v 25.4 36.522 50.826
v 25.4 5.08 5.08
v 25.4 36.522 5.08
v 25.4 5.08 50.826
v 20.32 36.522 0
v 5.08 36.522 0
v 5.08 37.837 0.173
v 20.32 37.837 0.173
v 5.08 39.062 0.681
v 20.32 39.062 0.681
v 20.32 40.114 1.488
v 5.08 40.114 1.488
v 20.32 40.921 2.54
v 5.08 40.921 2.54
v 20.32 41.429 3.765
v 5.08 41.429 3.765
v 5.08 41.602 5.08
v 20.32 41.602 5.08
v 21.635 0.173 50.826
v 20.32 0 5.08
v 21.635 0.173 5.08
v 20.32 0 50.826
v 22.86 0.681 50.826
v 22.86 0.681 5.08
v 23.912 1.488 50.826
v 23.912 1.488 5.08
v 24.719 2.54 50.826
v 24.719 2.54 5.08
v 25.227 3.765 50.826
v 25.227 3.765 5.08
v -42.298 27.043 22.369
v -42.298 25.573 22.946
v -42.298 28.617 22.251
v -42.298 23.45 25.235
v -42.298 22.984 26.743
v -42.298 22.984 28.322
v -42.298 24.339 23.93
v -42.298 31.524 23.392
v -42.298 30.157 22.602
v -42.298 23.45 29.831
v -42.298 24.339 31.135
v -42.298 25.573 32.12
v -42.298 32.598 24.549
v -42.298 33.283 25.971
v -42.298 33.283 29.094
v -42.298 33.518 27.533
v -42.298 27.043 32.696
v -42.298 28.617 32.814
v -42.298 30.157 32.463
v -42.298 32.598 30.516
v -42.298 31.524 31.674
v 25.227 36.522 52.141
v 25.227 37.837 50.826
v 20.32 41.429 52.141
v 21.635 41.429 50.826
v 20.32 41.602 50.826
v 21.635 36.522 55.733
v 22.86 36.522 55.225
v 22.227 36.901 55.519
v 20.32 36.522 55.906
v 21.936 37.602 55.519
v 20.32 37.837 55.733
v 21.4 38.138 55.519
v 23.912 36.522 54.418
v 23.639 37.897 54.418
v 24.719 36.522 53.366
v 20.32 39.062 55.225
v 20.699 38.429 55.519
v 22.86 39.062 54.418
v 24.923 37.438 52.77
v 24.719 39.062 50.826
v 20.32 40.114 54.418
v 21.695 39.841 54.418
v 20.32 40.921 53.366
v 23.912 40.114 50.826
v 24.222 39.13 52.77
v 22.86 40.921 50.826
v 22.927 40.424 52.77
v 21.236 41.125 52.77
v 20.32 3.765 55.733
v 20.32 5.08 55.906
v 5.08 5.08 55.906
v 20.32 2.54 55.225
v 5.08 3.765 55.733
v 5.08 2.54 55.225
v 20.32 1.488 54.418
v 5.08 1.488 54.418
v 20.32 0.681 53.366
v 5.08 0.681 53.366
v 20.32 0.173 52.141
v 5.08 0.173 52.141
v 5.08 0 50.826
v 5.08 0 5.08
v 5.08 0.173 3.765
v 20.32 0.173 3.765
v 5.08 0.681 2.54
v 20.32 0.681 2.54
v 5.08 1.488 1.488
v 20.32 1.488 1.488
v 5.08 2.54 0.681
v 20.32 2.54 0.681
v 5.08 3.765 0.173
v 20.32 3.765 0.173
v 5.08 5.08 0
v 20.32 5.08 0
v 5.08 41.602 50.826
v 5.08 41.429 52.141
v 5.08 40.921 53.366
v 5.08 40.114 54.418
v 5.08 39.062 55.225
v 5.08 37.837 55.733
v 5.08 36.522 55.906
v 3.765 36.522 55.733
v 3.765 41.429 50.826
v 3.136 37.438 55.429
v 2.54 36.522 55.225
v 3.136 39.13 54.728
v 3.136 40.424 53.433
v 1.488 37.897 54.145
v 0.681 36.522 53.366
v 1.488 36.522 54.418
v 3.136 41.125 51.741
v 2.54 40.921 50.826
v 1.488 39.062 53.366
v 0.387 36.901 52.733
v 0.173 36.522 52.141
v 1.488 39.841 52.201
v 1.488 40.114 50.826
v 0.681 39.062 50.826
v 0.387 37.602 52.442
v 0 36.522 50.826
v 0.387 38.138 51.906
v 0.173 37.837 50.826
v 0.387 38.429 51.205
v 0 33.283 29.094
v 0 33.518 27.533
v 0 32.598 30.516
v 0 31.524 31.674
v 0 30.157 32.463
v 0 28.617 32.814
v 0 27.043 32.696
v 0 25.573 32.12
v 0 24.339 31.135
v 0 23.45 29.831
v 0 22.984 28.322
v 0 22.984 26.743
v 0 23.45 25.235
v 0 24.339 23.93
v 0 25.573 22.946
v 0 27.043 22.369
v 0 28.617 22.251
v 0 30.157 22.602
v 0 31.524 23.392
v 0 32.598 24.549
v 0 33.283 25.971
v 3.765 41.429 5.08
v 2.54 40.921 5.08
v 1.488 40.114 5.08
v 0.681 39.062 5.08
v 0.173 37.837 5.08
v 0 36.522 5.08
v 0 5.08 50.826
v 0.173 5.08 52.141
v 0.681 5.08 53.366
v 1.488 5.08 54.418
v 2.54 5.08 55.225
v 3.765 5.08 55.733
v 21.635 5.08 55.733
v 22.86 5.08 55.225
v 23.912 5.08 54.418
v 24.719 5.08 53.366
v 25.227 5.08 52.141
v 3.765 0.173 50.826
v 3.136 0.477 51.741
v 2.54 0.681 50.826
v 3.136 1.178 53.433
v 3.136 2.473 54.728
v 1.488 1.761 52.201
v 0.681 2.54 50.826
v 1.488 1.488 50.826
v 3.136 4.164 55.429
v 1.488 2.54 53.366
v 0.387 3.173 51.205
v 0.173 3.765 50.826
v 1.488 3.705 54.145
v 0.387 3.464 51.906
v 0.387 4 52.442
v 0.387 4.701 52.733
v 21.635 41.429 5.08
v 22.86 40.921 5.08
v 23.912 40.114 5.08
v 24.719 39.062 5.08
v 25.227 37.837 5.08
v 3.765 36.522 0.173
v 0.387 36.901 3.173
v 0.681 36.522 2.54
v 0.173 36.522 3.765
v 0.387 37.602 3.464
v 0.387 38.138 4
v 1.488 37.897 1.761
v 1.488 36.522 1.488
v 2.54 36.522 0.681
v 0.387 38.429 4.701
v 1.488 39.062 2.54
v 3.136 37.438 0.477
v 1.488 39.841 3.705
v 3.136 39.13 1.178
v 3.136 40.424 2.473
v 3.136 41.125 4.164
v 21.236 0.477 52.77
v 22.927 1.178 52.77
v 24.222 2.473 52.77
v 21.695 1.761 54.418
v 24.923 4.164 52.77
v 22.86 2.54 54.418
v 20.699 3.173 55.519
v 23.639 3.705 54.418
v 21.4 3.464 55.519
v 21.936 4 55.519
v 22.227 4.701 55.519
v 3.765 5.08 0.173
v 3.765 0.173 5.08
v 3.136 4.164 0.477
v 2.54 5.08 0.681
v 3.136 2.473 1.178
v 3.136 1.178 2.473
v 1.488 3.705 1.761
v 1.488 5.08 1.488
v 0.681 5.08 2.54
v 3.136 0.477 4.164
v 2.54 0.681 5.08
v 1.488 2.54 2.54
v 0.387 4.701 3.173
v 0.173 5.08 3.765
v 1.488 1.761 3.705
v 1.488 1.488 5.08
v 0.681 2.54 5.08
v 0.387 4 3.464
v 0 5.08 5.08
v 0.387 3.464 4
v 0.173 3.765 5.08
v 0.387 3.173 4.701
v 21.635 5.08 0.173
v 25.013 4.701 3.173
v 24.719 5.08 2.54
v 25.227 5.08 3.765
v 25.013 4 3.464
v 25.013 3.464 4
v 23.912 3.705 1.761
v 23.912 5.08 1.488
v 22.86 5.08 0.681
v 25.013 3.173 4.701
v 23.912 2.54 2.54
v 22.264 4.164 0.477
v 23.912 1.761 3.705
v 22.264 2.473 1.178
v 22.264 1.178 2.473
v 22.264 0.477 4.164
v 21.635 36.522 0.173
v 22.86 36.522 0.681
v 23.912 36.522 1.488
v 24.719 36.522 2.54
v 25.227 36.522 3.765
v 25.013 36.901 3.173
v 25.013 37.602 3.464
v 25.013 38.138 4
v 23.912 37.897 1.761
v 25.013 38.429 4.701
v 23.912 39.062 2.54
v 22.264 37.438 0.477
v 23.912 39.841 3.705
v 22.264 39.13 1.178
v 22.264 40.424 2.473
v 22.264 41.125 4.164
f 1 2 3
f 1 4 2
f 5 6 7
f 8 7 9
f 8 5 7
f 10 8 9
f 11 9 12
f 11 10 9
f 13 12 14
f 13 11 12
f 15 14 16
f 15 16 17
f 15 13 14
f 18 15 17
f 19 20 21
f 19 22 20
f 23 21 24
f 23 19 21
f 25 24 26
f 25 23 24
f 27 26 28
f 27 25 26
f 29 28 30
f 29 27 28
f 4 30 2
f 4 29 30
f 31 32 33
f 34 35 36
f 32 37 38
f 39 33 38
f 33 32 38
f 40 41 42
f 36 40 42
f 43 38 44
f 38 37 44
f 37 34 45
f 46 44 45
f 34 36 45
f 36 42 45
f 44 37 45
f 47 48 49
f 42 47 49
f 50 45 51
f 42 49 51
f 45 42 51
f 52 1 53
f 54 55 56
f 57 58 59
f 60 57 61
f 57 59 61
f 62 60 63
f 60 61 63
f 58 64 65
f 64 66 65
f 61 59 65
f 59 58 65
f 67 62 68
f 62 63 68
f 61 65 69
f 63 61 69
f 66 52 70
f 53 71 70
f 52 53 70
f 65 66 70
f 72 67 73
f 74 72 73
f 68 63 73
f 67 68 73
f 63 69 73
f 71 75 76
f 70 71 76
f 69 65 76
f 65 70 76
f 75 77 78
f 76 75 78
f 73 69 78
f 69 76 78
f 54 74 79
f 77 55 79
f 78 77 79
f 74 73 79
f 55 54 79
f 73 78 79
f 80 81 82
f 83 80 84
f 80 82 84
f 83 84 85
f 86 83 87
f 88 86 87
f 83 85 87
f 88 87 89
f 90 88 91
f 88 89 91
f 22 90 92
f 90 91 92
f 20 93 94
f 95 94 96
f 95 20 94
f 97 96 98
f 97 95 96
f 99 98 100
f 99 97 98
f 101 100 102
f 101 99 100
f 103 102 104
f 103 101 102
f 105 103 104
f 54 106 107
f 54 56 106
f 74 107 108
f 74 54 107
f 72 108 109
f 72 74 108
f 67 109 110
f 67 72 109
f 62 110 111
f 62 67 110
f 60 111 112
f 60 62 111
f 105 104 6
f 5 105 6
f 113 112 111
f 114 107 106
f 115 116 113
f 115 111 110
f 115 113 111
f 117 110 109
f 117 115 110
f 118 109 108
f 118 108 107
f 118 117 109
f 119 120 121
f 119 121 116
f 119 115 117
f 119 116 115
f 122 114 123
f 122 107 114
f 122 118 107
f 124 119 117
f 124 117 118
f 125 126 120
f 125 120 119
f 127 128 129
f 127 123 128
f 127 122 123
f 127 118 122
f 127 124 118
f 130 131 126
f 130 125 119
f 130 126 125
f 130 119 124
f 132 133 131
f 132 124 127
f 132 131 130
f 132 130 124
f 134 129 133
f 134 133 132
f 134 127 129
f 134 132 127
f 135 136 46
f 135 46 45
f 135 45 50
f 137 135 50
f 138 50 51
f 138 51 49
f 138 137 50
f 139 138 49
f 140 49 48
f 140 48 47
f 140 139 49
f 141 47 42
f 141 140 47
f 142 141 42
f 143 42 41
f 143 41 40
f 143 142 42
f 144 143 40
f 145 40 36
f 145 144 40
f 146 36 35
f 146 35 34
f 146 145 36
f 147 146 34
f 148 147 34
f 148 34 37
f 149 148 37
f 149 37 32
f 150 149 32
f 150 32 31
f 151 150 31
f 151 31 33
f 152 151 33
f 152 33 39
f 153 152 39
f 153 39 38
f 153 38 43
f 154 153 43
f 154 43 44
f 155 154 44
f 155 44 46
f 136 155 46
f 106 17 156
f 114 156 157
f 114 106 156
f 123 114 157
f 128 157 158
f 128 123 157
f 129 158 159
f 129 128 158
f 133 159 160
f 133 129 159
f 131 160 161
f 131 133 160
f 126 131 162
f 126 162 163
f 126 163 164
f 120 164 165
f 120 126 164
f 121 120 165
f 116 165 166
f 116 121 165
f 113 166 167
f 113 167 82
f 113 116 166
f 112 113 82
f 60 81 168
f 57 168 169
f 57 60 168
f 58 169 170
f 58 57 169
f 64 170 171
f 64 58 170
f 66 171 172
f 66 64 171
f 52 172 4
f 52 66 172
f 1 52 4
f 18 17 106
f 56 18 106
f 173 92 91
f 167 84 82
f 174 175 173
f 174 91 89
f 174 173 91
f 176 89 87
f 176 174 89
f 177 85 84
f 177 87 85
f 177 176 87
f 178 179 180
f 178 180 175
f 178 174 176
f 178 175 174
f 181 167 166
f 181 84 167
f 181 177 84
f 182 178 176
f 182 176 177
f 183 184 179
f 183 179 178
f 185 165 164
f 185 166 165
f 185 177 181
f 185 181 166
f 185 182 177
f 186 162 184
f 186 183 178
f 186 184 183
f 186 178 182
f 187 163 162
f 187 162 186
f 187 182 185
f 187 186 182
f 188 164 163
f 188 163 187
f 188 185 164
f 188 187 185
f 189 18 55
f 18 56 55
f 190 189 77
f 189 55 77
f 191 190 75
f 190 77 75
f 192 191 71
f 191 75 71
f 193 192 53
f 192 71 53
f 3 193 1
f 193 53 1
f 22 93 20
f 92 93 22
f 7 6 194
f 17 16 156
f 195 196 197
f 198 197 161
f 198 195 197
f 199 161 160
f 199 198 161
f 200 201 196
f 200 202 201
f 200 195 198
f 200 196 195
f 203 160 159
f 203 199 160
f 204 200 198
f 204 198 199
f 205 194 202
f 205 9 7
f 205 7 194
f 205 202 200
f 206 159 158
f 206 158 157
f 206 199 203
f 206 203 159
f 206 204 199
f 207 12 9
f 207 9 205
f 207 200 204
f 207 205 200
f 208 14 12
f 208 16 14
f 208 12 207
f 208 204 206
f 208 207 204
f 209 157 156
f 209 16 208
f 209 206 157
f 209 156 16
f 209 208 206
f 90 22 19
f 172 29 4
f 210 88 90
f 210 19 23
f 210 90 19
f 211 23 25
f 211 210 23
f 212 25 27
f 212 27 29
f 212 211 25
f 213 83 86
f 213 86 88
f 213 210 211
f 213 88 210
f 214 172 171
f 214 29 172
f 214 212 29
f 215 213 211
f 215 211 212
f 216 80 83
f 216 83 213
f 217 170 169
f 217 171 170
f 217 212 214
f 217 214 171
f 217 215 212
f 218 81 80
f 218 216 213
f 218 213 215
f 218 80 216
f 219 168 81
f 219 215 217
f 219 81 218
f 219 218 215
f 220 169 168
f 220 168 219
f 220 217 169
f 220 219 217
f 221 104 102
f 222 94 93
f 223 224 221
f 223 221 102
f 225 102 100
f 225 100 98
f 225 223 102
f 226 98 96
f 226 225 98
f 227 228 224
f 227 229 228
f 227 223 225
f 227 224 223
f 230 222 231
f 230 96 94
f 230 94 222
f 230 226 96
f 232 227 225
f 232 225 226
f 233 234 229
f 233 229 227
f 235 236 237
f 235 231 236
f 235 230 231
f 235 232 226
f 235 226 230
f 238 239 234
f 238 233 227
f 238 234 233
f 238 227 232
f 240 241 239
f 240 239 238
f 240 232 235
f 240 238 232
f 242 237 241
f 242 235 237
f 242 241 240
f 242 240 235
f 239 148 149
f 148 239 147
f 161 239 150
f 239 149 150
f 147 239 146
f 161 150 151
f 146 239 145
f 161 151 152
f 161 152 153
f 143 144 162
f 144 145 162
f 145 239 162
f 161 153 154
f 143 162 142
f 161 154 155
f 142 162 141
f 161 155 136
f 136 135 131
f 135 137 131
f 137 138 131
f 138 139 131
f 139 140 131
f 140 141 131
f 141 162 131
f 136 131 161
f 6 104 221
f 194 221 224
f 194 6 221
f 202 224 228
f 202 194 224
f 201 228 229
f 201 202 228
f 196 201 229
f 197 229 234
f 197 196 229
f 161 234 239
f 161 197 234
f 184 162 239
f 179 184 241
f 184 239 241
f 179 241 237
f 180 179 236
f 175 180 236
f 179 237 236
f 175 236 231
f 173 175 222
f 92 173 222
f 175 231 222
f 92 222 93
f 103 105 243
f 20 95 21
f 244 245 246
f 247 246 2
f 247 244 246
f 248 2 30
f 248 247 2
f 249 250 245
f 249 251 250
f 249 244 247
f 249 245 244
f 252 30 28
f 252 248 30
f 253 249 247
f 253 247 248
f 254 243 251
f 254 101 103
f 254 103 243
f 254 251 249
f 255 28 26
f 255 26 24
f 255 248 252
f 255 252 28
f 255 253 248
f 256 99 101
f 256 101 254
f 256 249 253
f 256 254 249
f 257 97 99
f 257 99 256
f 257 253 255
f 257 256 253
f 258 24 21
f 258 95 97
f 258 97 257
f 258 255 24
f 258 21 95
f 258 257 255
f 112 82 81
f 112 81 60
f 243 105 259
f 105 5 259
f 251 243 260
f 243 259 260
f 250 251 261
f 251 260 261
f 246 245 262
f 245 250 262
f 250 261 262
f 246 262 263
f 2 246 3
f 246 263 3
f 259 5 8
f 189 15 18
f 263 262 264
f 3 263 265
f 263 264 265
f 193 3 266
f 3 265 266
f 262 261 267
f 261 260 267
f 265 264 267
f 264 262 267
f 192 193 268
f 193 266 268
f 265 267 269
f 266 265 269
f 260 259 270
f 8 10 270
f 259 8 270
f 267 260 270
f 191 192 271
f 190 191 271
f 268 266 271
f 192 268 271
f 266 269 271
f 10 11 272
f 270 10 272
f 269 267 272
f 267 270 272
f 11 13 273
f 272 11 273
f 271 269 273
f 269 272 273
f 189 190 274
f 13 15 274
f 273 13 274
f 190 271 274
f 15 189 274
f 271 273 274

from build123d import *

# Parameters (mm, degrees)
F2_W         = 41.6020527482
F2_H         = 55.9058710933
F3_DEPTH     = 25.4
F4_R         = 5.08
F5_T1_DEPTH  = 45.7458710933
F5_T3_DEPTH  = 31.4420527482
F5_T5_DEPTH  = 15.24
F5_S9_W      = 5.08
F5_S9_H      = 5.08
F5_T10_DEPTH = 5.08
F5_S15_W     = 5.08
F5_S15_H     = 5.08
F5_T16_DEPTH = 5.08
F5_S21_W     = 5.08
F5_S21_H     = 5.08
F5_T22_DEPTH = 5.08
F5_S27_W     = 5.08
F5_S27_H     = 5.08
F5_T28_DEPTH = 5.08
F7_DEPTH     = 25.4
F8_R         = 5.2966255489
F9_DEPTH     = 67.6975995302


# Not quite as in the source:
# - a fillet or chamfer that OpenCascade refuses, or shapes differently, is made with other operations: its cross-section is extruded or revolved along the edge and cut away or added


with BuildPart() as f3:
    # F2 (on face) → F3 (new body)
    with BuildSketch(Plane.YZ):
        with Locations((20.8010263741, 27.9529355466)):
            Rectangle(F2_W, F2_H)
    extrude(amount=F3_DEPTH)

    # F4
    f4_edges = [f3.edges().sort_by_distance(p)[0] for p in [
        (12.7, 0, 0),
        (12.7, 41.602053, 0),
        (0, 20.801026, 0),
        (25.4, 20.801026, 0),
        (25.4, 41.602053, 27.952936),
        (25.4, 20.801026, 55.905871),
        (25.4, 0, 27.952936),
        (12.7, 41.602053, 55.905871),
        (0, 41.602053, 27.952936),
    ]]
    fillet(f4_edges, radius=F4_R)

    # F5: fillet of radius 5.08 on 3 edges, made by hand

    # F5_s2 → F5_t1 (cut)
    with BuildSketch(Plane.XY.offset(5.08)):
        with BuildLine():
            ThreePointArc((0, 5.08), (1.4878975516, 1.4878975516), (5.08, 0))
            Line((5.08, 0), (0, 0))
            Line((0, 0), (0, 5.08))
        make_face()
    extrude(amount=F5_T1_DEPTH, mode=Mode.SUBTRACT)

    # F5_s4 → F5_t3 (cut)
    with BuildSketch(Plane.XZ.offset(-36.5220527482)):
        with BuildLine():
            ThreePointArc((0, 50.8258710933), (1.4878975516, 54.4179735417), (5.08, 55.9058710933))
            Line((5.08, 55.9058710933), (0, 55.9058710933))
            Line((0, 55.9058710933), (0, 50.8258710933))
        make_face()
    extrude(amount=F5_T3_DEPTH, mode=Mode.SUBTRACT)

    # F5_s6 → F5_t5 (cut)
    with BuildSketch(Plane.YZ.offset(5.08)):
        with BuildLine():
            ThreePointArc((5.08, 55.9058710933), (1.4878975516, 54.4179735417), (0, 50.8258710933))
            Line((0, 50.8258710933), (0, 55.9058710933))
            Line((0, 55.9058710933), (5.08, 55.9058710933))
        make_face()
    extrude(amount=F5_T5_DEPTH, mode=Mode.SUBTRACT)


with BuildPart() as f5_tool8:
    # F5_s9 → F5_t10 (new body)
    with BuildSketch(Plane.XY.offset(50.8258710933)):
        with Locations((22.86, 2.54)):
            Rectangle(F5_S9_W, F5_S9_H)
    extrude(amount=F5_T10_DEPTH)

    # F5_s11 → F5_t12 (revolve, cut)
    with BuildSketch(Plane(origin=(20.32, 5.08, 50.8258710933), x_dir=(-0.7071067812, 0.7071067812, 0), z_dir=(0.7071067812, 0.7071067812, 0))):
        with BuildLine():
            ThreePointArc((0, -5.08), (5.08, 0), (0, 5.08))
            Line((0, 5.08), (0, -5.08))
        make_face()
    revolve(axis=Axis((20.32, 5.08, 50.8258710933), (0, 0, 1)), mode=Mode.SUBTRACT)


with BuildPart() as f3_1:
    add(f3.part)

    # F5_t7: cut F5_tool8
    add(f5_tool8.part, mode=Mode.SUBTRACT)


with BuildPart() as f5_tool14:
    # F5_s15 → F5_t16 (new body)
    with BuildSketch(Plane.YZ.offset(5.08)):
        with Locations((39.0620527482, 53.3658710933)):
            Rectangle(F5_S15_W, F5_S15_H)
    extrude(amount=-F5_T16_DEPTH)

    # F5_s17 → F5_t18 (revolve, cut)
    with BuildSketch(Plane(origin=(5.08, 36.5220527482, 50.8258710933), x_dir=(0, -0.7071067812, -0.7071067812), z_dir=(0, 0.7071067812, -0.7071067812))):
        with BuildLine():
            ThreePointArc((0, -5.08), (5.08, 0), (0, 5.08))
            Line((0, 5.08), (0, -5.08))
        make_face()
    revolve(axis=Axis((5.08, 36.5220527482, 50.8258710933), (-1, 0, 0)), mode=Mode.SUBTRACT)


with BuildPart() as f3_2:
    add(f3_1.part)

    # F5_t13: cut F5_tool14
    add(f5_tool14.part, mode=Mode.SUBTRACT)


with BuildPart() as f5_tool20:
    # F5_s21 → F5_t22 (new body)
    with BuildSketch(Plane.YZ.offset(5.08)):
        with Locations((2.54, 2.54)):
            Rectangle(F5_S21_W, F5_S21_H)
    extrude(amount=-F5_T22_DEPTH)

    # F5_s23 → F5_t24 (revolve, cut)
    with BuildSketch(Plane(origin=(5.08, 5.08, 5.08), x_dir=(0, 0.7071067812, 0.7071067812), z_dir=(0, -0.7071067812, 0.7071067812))):
        with BuildLine():
            ThreePointArc((0, -5.08), (5.08, 0), (0, 5.08))
            Line((0, 5.08), (0, -5.08))
        make_face()
    revolve(axis=Axis((5.08, 5.08, 5.08), (-1, 0, 0)), mode=Mode.SUBTRACT)


with BuildPart() as f3_3:
    add(f3_2.part)

    # F5_t19: cut F5_tool20
    add(f5_tool20.part, mode=Mode.SUBTRACT)


with BuildPart() as f5_tool26:
    # F5_s27 → F5_t28 (new body)
    with BuildSketch(Plane.YZ.offset(5.08)):
        with Locations((2.54, 53.3658710933)):
            Rectangle(F5_S27_W, F5_S27_H)
    extrude(amount=-F5_T28_DEPTH)

    # F5_s29 → F5_t30 (revolve, cut)
    with BuildSketch(Plane(origin=(5.08, 5.08, 50.8258710933), x_dir=(0, 0.7071067812, -0.7071067812), z_dir=(0, 0.7071067812, 0.7071067812))):
        with BuildLine():
            ThreePointArc((0, -5.08), (5.08, 0), (0, 5.08))
            Line((0, 5.08), (0, -5.08))
        make_face()
    revolve(axis=Axis((5.08, 5.08, 50.8258710933), (-1, 0, 0)), mode=Mode.SUBTRACT)


with BuildPart() as f3_4:
    add(f3_3.part)

    # F5_t25: cut F5_tool26
    add(f5_tool26.part, mode=Mode.SUBTRACT)

    # F6 (on face) → F7 (cut)
    with BuildSketch(Plane.YZ.offset(25.4)):
        with BuildLine():
            ThreePointArc((28.6198008208, 24.1723779255), (30.5921769571, 25.8541960079), (31.3290304018, 28.3393170685))
            ThreePointArc((31.3290304018, 28.3393170685), (28.3928704941, 32.5997711108), (23.3662914361, 31.3725764954))
            ThreePointArc((23.3662914361, 31.3725764954), (26.7699286342, 28.3393170685), (28.6198008208, 24.1723779255))
        make_face()
        with BuildLine():
            ThreePointArc((28.6198008208, 24.1723779255), (26.7699286342, 28.3393170685), (23.3662914361, 31.3725764954))
            ThreePointArc((23.3662914361, 31.3725764954), (23.0869595481, 25.652097755), (28.6198008208, 24.1723779255))
        make_face()
        with BuildLine():
            ThreePointArc((28.6198008208, 24.1723779255), (23.0869595481, 25.652097755), (23.3662914361, 31.3725764954))
            ThreePointArc((23.3662914361, 31.3725764954), (8.7034109088, 16.5279412286), (28.8466709714, 21.9696629792))
            ThreePointArc((28.8466709714, 21.9696629792), (28.7898038098, 23.0768467038), (28.6198008208, 24.1723779255))
        make_face()
    extrude(amount=F7_DEPTH, mode=Mode.SUBTRACT)

    # F8 (on face) → F9 (join)
    with BuildSketch(Plane.YZ.offset(25.4)):
        with Locations((28.2216444612, 27.5326687843)):
            Circle(F8_R)
    extrude(amount=-F9_DEPTH)


solid = f3_4.part
